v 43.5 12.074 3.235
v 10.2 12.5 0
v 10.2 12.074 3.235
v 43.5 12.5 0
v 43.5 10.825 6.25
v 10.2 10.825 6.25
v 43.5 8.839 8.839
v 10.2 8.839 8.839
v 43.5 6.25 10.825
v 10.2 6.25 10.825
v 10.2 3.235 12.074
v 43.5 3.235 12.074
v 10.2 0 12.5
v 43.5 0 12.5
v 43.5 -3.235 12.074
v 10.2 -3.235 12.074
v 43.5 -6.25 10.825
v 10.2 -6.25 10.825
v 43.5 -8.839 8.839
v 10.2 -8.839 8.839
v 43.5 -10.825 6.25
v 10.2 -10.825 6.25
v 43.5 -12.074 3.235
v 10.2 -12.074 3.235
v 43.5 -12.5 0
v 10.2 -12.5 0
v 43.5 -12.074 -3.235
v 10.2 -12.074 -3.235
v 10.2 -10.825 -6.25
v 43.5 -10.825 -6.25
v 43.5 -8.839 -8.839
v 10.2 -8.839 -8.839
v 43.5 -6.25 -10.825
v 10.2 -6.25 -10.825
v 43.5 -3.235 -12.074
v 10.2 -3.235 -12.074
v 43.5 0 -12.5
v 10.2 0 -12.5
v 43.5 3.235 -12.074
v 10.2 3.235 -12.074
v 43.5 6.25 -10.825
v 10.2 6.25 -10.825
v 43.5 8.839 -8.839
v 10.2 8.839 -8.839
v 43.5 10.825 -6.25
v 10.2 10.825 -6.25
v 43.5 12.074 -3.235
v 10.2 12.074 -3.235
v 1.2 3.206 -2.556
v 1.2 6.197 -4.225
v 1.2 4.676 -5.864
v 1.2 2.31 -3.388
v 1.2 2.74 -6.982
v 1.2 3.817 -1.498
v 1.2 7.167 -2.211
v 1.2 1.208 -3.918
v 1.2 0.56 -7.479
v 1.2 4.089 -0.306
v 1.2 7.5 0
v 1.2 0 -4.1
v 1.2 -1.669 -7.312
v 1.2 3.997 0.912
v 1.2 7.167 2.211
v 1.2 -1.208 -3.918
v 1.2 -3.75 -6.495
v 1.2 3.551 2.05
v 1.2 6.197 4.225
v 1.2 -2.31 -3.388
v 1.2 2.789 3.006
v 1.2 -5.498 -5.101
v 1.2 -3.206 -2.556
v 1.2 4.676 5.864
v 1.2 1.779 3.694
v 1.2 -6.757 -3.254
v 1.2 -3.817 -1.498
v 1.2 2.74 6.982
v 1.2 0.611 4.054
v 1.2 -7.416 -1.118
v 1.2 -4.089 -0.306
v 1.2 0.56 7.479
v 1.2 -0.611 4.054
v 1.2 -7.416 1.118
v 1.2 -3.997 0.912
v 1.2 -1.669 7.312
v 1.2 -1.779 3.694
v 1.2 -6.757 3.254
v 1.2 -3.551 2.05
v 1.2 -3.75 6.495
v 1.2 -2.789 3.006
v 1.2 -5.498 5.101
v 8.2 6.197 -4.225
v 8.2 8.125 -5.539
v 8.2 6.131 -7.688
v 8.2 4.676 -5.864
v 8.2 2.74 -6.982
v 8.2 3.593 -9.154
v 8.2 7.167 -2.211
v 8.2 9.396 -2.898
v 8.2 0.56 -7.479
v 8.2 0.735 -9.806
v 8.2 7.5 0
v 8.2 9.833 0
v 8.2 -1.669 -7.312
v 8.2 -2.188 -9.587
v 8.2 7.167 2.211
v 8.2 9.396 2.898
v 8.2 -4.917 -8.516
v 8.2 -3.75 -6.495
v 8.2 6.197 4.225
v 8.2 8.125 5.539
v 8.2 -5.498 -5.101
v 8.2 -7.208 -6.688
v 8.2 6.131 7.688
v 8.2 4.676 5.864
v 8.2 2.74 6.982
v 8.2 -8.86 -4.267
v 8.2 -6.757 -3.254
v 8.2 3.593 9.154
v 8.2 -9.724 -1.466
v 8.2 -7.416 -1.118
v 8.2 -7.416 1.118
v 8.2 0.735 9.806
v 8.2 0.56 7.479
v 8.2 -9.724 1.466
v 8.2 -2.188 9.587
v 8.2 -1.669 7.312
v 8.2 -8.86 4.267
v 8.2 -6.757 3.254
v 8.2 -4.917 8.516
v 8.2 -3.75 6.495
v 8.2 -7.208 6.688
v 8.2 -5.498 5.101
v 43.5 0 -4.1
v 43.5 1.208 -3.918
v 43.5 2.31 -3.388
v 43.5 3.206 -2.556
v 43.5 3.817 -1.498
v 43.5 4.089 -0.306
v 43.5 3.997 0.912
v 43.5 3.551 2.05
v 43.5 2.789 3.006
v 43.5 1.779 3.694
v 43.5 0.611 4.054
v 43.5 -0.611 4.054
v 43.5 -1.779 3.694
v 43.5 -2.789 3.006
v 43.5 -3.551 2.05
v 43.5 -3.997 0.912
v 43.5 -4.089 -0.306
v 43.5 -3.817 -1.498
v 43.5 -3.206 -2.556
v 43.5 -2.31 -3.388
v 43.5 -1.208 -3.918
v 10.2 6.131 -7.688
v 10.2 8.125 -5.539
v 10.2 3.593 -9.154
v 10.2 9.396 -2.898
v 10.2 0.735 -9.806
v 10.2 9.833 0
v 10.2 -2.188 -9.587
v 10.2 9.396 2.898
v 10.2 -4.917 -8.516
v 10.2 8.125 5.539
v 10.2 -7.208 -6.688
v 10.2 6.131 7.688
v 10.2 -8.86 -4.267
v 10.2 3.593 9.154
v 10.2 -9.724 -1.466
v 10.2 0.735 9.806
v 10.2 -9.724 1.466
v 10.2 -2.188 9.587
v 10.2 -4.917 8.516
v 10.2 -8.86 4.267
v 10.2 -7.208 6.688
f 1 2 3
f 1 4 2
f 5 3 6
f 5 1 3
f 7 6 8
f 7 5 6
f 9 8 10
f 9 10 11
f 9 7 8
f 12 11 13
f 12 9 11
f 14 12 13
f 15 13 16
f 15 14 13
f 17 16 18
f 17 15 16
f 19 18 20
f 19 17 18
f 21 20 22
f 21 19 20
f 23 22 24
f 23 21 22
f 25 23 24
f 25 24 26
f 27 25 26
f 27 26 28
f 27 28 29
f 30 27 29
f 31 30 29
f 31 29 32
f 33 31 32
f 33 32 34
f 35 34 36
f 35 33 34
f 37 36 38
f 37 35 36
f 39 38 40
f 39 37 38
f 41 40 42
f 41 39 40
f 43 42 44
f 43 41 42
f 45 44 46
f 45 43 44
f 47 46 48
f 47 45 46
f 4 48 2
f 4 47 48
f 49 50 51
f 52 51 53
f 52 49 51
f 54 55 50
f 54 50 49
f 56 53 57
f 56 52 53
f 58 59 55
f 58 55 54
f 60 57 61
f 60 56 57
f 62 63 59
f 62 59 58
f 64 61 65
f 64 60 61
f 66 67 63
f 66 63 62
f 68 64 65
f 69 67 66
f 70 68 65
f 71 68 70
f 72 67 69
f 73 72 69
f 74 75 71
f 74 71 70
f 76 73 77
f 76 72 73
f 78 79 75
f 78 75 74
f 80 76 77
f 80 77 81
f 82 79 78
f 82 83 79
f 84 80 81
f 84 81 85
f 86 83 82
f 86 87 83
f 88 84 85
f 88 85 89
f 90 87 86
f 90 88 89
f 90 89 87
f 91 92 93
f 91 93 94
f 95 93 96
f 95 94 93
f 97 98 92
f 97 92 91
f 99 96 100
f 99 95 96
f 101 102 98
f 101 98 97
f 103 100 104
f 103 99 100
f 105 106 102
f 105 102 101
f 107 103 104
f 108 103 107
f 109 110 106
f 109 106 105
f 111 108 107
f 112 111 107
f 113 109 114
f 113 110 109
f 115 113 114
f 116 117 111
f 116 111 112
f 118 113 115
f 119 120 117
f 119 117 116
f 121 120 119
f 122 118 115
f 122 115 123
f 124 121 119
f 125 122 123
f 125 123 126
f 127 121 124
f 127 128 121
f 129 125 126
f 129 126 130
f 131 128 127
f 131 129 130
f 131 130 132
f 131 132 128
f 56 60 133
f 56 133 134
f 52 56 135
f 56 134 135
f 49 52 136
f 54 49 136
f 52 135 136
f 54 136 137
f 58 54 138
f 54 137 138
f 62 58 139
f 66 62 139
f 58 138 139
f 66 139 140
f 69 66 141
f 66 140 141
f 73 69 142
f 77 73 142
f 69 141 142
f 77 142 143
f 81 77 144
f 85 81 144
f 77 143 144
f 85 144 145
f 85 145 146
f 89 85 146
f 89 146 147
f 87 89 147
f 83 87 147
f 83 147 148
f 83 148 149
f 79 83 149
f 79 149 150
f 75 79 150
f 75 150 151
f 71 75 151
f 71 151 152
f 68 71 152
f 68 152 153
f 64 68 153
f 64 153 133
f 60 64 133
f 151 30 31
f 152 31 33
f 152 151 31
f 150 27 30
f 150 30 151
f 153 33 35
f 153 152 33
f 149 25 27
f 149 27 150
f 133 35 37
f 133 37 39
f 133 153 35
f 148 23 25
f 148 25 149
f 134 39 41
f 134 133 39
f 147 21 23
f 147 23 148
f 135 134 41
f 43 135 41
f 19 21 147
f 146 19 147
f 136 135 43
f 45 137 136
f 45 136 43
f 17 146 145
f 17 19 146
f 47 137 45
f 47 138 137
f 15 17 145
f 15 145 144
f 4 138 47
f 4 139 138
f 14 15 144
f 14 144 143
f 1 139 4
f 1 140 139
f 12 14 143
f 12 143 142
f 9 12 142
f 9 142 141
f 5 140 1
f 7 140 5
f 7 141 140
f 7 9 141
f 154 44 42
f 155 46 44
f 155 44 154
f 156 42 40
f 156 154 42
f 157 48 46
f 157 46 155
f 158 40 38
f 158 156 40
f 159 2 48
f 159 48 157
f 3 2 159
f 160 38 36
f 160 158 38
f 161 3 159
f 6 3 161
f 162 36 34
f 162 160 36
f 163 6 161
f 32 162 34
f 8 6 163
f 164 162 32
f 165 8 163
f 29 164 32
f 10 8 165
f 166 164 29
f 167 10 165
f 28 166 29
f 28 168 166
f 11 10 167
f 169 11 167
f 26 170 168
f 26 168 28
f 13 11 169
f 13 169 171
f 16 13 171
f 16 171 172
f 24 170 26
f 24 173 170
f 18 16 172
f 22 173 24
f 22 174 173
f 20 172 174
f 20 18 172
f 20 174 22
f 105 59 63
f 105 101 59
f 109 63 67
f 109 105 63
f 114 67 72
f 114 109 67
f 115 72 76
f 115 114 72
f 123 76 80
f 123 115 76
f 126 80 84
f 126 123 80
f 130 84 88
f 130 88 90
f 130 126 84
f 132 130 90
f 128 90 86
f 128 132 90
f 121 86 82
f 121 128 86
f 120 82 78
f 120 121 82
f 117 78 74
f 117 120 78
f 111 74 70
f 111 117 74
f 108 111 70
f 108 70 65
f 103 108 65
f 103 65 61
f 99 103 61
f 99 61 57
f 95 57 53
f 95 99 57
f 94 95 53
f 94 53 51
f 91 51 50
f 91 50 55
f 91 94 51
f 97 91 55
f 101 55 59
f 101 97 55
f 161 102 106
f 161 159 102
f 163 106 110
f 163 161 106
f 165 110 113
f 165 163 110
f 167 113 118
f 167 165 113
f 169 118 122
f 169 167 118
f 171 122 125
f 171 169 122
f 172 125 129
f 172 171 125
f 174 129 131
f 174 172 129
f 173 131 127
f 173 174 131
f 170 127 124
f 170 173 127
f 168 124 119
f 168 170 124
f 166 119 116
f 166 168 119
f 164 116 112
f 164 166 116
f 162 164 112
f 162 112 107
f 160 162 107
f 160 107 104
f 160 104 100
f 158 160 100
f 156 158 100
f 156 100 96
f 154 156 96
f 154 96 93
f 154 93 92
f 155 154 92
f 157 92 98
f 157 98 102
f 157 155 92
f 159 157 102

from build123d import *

# Parameters (mm, degrees)
HOLE_WIZARD_8_2_8_2_1_D = 8.2


with BuildPart() as part:
    # Эскиз1 → Повернуть1 (revolve)
    with BuildSketch(Plane.XY):
        Polygon((1.2, 0), (1.2, 7.5), (8.2, 7.5), (8.2, 9.833333333), (10.2, 9.833333333), (10.2, 12.5), (43.5, 12.5), (43.5, 0), align=None)
    revolve(axis=Axis((-1000, 0, 0), (1, 0, 0)))

    # Диаметр отверстия Ø8.2 (8.2)1 (through all)
    with Locations(Plane.ZY.offset(-1.2)):
        with Locations((0, 0)):
            Hole(HOLE_WIZARD_8_2_8_2_1_D / 2)


solid = part.part
